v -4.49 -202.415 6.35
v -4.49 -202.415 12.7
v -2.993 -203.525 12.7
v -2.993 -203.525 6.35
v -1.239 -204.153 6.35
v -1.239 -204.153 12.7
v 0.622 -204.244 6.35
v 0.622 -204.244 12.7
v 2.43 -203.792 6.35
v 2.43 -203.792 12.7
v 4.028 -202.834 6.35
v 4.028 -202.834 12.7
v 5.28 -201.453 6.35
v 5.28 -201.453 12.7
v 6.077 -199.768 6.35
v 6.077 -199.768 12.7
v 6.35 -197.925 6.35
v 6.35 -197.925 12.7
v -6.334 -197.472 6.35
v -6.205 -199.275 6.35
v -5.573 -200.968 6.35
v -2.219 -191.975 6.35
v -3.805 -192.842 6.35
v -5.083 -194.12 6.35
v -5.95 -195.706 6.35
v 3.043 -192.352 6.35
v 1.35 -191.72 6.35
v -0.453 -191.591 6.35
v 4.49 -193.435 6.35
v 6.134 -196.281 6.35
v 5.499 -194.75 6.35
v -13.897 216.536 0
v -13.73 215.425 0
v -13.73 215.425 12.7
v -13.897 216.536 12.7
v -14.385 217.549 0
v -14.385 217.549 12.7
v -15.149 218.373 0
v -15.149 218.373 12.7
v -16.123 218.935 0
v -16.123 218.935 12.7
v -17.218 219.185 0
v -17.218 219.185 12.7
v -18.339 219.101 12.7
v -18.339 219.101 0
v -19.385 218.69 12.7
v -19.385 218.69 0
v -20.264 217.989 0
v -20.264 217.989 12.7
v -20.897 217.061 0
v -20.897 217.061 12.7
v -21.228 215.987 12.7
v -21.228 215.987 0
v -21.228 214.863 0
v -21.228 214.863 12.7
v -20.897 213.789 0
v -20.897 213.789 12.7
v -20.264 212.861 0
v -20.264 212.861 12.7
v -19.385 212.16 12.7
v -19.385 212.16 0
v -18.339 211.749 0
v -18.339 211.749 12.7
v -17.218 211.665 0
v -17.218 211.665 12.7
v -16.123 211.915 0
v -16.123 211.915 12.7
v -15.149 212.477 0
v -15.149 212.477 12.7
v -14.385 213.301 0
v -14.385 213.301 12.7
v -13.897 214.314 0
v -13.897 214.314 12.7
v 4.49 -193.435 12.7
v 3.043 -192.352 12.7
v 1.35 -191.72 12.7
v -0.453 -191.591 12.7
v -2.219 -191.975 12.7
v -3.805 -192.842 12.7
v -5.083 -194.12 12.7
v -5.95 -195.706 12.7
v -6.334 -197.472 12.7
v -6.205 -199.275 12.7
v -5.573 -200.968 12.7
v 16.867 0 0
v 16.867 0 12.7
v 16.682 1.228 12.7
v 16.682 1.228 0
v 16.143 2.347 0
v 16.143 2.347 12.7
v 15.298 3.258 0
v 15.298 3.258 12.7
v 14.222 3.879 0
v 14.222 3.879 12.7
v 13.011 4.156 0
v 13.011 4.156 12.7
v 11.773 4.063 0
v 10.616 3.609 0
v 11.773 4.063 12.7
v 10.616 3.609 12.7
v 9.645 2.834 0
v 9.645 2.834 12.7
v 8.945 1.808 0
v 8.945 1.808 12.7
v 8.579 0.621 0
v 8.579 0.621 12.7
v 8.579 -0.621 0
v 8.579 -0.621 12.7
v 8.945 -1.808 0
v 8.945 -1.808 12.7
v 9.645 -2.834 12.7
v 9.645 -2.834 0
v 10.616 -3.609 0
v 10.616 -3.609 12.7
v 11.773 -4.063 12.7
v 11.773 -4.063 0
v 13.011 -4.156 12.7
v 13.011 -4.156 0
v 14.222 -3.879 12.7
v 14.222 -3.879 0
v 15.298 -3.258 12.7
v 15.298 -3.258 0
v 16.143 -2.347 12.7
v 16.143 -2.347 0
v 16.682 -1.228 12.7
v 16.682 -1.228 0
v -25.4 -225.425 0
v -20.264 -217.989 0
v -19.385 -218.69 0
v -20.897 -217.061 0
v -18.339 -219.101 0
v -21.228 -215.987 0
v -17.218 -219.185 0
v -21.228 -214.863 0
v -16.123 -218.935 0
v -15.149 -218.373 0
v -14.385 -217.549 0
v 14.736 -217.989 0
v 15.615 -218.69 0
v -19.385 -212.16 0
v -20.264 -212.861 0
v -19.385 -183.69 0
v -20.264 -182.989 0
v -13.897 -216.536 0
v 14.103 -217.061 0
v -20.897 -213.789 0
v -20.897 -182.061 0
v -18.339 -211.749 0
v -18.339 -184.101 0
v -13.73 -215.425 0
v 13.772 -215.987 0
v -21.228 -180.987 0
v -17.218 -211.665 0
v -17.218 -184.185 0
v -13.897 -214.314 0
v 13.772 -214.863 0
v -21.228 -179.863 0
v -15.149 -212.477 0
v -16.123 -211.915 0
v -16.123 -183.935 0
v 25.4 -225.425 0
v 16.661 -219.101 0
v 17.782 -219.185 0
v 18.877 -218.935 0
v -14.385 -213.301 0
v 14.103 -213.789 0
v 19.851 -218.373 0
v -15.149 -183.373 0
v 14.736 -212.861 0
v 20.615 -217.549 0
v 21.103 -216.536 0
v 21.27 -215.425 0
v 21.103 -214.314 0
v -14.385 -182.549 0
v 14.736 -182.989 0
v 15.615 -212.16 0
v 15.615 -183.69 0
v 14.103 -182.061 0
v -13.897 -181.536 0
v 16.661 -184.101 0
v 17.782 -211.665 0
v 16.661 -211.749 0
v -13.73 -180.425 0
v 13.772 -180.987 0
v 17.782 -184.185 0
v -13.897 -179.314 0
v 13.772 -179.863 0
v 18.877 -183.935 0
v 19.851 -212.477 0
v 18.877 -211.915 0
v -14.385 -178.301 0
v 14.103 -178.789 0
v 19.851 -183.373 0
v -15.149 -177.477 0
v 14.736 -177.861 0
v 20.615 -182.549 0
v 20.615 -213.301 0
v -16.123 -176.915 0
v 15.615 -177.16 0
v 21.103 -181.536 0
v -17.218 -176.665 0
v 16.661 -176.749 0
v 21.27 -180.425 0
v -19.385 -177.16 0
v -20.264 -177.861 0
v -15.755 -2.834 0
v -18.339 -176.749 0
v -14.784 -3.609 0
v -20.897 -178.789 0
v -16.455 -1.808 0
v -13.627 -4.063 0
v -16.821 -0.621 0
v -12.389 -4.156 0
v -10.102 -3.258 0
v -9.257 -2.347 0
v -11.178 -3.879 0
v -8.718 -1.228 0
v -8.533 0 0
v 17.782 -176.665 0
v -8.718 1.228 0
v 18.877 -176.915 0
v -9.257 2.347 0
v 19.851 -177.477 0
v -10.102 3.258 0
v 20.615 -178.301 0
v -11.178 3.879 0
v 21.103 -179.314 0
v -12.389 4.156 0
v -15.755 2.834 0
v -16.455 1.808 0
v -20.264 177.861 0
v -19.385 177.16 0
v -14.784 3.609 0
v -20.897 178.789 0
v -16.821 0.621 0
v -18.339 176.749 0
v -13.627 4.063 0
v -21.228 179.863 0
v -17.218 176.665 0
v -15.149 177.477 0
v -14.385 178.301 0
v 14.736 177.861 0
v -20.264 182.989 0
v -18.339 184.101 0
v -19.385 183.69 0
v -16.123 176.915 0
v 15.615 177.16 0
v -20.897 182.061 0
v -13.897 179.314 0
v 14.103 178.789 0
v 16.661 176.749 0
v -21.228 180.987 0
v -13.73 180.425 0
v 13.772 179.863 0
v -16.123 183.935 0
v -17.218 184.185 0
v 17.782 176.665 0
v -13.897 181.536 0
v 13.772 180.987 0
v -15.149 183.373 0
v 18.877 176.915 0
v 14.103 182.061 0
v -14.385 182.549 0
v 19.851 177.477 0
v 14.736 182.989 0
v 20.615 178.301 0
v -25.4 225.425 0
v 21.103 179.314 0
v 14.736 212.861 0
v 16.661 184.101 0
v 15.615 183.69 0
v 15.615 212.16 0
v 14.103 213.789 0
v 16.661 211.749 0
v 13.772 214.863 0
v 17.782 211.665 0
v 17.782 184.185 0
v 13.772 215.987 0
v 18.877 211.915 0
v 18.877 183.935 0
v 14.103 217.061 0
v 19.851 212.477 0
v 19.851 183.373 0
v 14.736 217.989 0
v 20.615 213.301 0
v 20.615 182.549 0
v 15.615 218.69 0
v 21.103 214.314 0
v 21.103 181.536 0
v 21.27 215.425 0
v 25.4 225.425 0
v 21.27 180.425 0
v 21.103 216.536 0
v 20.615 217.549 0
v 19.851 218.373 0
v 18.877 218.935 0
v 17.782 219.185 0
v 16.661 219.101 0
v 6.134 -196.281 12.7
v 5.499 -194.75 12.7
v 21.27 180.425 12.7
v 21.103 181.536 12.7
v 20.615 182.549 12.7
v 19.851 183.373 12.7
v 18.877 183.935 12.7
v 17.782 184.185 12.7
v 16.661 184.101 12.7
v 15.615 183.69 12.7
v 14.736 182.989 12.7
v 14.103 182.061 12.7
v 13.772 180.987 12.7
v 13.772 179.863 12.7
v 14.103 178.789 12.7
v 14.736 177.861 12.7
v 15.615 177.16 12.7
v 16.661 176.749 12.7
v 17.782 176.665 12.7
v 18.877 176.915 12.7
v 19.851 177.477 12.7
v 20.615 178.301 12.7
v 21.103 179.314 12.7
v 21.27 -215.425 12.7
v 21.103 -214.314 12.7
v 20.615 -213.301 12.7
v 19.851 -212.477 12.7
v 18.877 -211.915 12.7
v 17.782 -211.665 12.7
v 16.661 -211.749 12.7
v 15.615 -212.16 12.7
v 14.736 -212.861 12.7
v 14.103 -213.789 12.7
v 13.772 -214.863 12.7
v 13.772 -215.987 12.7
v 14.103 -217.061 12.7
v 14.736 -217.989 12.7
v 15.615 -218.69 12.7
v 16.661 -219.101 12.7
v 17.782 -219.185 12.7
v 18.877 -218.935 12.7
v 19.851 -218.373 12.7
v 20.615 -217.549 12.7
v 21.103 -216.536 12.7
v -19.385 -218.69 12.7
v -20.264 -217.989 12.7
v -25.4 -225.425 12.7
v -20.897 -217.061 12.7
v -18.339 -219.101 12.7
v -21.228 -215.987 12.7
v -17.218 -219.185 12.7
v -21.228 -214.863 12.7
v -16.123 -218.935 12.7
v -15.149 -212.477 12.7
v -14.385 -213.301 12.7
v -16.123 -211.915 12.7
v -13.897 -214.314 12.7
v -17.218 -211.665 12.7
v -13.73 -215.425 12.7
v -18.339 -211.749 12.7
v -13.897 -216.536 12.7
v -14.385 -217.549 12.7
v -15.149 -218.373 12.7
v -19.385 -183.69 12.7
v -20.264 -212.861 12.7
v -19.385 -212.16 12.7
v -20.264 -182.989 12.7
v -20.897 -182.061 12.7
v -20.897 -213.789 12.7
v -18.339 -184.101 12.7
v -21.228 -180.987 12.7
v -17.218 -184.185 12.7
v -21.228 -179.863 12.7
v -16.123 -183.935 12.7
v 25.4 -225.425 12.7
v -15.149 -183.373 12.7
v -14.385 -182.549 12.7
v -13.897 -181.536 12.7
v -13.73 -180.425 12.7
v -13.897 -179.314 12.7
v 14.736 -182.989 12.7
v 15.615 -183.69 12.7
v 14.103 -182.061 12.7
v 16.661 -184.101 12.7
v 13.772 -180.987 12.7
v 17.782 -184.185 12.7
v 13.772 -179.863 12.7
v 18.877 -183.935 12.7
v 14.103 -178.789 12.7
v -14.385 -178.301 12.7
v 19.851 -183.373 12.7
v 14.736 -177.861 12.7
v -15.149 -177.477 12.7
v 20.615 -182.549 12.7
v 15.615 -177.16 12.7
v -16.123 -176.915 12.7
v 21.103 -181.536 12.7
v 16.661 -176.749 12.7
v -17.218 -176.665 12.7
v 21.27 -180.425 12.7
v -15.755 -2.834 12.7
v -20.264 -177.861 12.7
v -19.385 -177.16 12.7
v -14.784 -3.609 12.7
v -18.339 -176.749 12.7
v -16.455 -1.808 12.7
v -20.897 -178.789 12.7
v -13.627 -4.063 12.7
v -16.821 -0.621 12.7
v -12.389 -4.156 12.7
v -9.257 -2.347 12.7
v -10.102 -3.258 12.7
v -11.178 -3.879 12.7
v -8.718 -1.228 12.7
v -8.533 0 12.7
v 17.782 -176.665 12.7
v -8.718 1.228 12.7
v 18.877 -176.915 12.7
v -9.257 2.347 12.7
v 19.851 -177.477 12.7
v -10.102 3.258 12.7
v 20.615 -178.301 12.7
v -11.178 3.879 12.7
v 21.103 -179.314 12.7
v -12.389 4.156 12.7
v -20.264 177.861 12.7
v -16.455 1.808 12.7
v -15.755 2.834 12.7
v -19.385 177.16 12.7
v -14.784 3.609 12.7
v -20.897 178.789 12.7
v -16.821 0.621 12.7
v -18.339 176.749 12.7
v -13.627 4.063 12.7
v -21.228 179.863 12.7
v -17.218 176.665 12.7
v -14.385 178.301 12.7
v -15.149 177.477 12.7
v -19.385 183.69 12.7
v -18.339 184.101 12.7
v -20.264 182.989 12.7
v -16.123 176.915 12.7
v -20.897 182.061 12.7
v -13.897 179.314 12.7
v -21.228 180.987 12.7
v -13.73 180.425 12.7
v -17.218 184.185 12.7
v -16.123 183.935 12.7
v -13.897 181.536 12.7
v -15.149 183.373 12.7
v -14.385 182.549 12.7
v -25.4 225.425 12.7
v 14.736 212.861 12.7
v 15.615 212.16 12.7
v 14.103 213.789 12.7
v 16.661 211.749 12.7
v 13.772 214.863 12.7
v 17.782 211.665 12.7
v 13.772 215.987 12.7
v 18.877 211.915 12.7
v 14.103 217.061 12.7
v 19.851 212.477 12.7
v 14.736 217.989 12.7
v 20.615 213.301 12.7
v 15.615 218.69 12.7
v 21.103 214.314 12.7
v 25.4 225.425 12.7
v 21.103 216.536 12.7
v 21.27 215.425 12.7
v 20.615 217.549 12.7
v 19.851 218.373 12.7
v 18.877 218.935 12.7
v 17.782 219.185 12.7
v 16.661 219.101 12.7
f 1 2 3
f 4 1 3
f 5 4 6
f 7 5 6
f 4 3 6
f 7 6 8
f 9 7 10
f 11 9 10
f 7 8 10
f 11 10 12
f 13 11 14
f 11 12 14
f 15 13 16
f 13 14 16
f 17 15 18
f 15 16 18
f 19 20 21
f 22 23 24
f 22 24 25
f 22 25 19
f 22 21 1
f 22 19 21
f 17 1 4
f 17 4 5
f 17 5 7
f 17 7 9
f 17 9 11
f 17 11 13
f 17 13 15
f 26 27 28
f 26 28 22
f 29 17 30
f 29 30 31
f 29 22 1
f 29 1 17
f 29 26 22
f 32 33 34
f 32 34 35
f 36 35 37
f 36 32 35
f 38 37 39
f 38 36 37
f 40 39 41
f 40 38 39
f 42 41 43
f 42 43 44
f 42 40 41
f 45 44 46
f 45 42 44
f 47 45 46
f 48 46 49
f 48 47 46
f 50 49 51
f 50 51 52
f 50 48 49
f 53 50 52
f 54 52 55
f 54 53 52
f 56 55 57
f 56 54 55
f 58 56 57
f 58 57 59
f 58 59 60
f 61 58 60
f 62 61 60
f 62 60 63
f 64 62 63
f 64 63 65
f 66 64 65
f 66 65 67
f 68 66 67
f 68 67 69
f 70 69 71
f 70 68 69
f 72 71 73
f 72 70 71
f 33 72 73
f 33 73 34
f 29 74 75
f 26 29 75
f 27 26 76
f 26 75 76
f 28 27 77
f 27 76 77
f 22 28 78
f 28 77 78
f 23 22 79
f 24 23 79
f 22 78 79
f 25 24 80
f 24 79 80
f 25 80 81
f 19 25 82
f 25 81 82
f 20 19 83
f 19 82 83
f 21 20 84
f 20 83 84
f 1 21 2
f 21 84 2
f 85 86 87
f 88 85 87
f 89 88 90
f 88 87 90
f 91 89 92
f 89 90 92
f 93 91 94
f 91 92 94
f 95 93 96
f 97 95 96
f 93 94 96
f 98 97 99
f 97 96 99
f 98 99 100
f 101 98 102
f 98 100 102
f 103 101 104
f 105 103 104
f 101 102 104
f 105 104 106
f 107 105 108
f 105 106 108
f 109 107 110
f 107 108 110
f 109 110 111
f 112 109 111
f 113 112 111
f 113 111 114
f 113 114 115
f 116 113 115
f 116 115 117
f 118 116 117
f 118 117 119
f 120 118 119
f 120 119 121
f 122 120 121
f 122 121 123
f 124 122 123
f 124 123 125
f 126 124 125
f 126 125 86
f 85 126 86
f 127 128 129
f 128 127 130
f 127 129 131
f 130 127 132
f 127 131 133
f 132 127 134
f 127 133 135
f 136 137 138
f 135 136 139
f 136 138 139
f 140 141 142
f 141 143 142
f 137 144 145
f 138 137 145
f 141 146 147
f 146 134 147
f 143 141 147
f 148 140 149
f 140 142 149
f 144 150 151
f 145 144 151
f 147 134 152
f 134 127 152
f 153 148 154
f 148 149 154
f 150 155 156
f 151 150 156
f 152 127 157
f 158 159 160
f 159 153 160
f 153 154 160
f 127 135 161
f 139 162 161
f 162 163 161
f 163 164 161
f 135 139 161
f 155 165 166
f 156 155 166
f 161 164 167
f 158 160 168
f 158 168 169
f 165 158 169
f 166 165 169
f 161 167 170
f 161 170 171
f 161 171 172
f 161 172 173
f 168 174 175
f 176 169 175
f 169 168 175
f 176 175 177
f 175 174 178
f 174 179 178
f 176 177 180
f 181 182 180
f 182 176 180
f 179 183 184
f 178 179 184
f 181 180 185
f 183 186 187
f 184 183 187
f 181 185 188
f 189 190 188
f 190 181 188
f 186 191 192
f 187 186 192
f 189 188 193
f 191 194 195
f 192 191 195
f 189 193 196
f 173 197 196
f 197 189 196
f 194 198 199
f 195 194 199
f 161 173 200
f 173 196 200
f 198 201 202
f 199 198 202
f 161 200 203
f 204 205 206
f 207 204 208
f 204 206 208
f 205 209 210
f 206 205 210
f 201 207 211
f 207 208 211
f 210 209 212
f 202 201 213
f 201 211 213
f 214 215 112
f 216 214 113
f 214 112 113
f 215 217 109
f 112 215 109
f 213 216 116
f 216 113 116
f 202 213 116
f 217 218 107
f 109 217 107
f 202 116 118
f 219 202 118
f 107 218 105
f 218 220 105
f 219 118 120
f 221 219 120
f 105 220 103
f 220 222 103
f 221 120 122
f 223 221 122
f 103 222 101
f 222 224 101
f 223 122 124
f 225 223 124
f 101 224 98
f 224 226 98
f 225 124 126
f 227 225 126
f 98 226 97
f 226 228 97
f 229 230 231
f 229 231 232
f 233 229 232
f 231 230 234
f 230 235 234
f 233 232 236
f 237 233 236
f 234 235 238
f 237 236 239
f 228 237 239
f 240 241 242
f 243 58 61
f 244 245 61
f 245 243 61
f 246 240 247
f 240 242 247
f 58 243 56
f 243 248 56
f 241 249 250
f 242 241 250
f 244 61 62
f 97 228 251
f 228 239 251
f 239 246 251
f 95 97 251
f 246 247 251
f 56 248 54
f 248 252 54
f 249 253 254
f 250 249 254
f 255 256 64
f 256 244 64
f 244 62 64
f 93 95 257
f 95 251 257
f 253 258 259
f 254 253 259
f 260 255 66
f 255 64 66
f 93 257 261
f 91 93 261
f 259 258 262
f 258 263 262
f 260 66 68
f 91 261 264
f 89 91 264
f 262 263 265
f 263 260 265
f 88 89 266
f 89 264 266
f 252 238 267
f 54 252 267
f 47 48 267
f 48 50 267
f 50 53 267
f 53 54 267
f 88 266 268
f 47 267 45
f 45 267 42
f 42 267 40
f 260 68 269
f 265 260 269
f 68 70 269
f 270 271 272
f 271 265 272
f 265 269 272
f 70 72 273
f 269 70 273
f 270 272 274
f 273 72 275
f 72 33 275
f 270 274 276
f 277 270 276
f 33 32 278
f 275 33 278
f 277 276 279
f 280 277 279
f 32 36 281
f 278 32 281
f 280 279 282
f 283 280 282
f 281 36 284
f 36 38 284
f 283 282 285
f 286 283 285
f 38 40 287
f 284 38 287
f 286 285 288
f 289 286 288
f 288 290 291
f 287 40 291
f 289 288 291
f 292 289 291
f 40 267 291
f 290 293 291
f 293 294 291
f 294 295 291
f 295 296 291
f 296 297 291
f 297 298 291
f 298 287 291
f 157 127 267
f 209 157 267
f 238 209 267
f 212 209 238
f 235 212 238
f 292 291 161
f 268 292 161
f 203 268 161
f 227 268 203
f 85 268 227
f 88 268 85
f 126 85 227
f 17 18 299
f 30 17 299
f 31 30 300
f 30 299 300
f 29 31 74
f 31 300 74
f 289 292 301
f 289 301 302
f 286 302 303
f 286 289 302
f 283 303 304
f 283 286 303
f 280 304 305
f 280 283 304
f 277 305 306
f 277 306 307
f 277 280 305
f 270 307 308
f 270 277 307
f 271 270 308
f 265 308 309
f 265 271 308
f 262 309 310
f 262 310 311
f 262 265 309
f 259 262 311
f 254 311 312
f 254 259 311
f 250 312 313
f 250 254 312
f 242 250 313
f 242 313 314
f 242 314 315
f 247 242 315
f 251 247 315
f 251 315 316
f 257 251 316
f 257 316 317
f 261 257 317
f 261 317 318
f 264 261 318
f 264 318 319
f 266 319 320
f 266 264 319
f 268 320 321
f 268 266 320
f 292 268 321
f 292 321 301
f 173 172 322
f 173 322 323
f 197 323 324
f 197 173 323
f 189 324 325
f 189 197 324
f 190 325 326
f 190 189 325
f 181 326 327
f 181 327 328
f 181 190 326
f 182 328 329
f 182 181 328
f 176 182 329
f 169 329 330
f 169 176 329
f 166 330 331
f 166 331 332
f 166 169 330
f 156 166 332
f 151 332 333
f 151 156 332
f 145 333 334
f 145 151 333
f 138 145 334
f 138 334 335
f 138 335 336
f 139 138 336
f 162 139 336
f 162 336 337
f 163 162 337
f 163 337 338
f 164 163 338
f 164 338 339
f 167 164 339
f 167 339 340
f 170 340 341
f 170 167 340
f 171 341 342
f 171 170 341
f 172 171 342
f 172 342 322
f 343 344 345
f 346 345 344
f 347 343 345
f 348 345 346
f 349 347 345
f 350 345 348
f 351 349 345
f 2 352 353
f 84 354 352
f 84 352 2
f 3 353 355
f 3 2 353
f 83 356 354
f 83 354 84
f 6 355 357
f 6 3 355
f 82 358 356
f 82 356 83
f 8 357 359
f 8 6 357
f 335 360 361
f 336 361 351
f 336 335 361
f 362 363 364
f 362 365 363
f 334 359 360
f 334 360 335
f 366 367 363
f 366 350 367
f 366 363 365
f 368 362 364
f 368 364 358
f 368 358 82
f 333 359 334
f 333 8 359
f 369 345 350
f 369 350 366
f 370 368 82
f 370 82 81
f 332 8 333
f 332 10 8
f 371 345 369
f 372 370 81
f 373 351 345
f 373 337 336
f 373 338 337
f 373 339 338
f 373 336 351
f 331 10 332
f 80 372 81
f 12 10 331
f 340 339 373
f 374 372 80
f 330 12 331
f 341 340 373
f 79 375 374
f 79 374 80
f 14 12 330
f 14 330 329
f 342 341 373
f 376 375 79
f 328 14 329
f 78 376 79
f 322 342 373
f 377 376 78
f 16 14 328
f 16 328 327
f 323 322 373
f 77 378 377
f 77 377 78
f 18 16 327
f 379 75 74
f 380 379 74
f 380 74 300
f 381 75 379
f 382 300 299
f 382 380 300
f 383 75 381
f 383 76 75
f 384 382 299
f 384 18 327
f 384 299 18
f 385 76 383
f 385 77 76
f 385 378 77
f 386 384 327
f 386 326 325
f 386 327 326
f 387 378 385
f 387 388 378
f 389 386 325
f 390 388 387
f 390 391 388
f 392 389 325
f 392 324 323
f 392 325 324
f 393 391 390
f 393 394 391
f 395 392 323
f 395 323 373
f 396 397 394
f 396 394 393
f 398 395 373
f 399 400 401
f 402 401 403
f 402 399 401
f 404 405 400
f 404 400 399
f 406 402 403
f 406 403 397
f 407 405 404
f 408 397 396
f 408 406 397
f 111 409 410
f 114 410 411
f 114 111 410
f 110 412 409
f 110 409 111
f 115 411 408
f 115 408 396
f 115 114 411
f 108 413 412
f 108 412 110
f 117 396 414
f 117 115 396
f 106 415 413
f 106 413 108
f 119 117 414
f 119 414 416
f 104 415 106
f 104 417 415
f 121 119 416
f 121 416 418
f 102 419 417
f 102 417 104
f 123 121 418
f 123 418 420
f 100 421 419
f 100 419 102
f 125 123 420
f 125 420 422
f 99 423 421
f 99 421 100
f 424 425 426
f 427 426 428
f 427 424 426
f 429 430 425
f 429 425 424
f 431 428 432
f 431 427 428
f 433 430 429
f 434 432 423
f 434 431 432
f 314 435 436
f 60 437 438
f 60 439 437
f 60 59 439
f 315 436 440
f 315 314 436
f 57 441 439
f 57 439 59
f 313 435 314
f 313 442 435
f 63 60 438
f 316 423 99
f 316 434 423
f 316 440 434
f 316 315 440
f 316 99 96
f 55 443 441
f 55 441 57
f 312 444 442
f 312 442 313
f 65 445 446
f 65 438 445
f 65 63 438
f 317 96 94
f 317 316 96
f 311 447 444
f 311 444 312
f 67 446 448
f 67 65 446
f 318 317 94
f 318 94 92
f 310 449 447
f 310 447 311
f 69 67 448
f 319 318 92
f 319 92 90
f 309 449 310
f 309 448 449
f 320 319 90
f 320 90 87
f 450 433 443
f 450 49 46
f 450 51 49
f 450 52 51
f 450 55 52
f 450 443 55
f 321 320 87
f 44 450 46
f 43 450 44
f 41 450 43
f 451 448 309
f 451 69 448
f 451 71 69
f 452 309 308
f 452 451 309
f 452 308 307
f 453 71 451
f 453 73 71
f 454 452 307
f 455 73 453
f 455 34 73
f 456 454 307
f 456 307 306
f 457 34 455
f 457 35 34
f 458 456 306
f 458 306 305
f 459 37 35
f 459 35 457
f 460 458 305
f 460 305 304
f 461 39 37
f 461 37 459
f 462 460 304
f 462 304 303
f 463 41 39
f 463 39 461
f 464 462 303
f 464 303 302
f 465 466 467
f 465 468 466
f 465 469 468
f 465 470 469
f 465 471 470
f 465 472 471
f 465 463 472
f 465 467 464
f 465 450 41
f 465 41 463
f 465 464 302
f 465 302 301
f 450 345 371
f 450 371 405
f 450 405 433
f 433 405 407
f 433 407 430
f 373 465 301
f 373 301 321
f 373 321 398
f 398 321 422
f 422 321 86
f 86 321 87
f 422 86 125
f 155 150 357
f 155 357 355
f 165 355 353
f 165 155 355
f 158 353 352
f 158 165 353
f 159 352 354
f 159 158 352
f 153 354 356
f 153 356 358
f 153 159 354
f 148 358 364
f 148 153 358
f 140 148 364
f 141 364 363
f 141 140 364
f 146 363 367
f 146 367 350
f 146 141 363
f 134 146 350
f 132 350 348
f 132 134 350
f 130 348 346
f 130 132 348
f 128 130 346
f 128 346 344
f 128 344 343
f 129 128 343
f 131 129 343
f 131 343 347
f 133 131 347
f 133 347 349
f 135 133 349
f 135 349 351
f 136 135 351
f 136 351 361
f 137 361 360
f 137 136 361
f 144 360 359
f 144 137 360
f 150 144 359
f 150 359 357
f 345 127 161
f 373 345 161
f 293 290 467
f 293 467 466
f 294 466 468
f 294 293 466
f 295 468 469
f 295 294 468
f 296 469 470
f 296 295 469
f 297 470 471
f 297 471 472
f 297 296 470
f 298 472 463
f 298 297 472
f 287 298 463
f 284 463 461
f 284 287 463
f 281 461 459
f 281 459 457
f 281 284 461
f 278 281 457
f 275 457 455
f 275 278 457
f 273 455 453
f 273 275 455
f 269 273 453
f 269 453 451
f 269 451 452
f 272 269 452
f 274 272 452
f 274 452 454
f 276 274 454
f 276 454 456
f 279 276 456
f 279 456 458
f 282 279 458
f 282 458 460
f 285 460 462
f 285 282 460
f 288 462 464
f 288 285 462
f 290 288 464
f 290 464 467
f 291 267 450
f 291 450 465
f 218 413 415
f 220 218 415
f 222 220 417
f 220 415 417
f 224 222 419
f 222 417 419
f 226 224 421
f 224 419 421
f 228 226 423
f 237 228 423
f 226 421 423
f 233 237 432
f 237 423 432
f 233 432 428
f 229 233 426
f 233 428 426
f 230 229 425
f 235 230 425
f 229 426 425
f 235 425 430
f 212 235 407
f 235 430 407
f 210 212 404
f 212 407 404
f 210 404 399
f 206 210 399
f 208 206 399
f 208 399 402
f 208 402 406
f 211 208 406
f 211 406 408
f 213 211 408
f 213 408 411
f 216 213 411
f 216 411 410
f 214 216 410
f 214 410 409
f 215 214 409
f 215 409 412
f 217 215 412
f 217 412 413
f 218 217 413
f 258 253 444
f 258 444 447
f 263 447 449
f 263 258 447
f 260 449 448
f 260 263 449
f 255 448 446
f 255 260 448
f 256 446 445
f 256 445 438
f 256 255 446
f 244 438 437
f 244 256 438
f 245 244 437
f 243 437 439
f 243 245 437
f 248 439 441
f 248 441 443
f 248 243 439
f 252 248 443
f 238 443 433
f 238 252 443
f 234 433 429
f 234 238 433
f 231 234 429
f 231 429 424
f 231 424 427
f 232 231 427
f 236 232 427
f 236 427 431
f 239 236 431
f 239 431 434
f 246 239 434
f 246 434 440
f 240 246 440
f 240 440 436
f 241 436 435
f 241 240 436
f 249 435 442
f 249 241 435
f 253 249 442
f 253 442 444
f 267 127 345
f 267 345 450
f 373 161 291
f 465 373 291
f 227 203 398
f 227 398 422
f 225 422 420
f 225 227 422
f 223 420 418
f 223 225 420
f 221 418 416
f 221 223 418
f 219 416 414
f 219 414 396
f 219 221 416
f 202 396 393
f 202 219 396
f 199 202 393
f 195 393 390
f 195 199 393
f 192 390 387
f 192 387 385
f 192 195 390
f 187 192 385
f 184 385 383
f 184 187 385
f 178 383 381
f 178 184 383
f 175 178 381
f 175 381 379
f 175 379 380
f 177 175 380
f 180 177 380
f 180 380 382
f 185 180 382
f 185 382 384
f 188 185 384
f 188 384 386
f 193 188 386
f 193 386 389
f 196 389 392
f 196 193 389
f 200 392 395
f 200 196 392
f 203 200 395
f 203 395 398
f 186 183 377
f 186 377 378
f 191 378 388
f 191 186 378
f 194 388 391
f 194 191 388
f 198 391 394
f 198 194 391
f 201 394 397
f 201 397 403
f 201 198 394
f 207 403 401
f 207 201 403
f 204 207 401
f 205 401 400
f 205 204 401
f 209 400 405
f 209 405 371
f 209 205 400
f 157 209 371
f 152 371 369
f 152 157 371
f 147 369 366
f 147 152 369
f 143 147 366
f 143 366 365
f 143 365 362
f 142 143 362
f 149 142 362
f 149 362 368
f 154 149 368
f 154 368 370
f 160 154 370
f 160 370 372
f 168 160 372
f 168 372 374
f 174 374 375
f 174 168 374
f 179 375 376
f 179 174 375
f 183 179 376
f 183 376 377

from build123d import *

# Parameters (mm, degrees)
F0_W     = 50.8
F0_H     = 450.85
F0_R     = 3.770313
F1_DEPTH = 12.7
F2_R     = 4.167188
F3_DEPTH = 25.4
F5_DEPTH = 6.35


with BuildPart() as f1:
    # F0 (on Top) → F1 (new body)
    with BuildSketch(Plane.XY):
        Rectangle(F0_W, F0_H)
        with Locations((-17.5, -215.425)):
            Circle(F0_R, mode=Mode.SUBTRACT)
        with Locations((-17.5, -180.425)):
            Circle(F0_R, mode=Mode.SUBTRACT)
        with Locations((17.5, -215.425)):
            Circle(F0_R, mode=Mode.SUBTRACT)
        with Locations((17.5, -180.425)):
            Circle(F0_R, mode=Mode.SUBTRACT)
        with Locations((-17.5, 180.425)):
            Circle(F0_R, mode=Mode.SUBTRACT)
        with Locations((-17.5, 215.425)):
            Circle(F0_R, mode=Mode.SUBTRACT)
        with Locations((17.5, 180.425)):
            Circle(F0_R, mode=Mode.SUBTRACT)
        with Locations((17.5, 215.425)):
            Circle(F0_R, mode=Mode.SUBTRACT)
    extrude(amount=F1_DEPTH)

    # F2 (on face) → F3 (cut)
    with BuildSketch(Plane.XY.offset(12.7)):
        with Locations((-12.7, 0)):
            Circle(F2_R)
        with Locations((12.7, 0)):
            Circle(F2_R)
    extrude(amount=-F3_DEPTH, mode=Mode.SUBTRACT)

    # F4 (on face) → F5 (cut)
    with BuildSketch(Plane.XY.offset(12.7)):
        with BuildLine():
            ThreePointArc((-4.490128, -202.415128), (2.43004, -203.791635), (6.35, -197.925))
            ThreePointArc((6.35, -197.925), (5.866635, -195.49496), (4.490128, -193.434872))
            Line((4.490128, -193.434872), (-4.490128, -202.415128))
        make_face()
        with BuildLine():
            Line((-4.490128, -202.415128), (4.490128, -193.434872))
            ThreePointArc((4.490128, -193.434872), (-4.490128, -193.434872), (-4.490128, -202.415128))
        make_face()
    extrude(amount=-F5_DEPTH, mode=Mode.SUBTRACT)


solid = f1.part
